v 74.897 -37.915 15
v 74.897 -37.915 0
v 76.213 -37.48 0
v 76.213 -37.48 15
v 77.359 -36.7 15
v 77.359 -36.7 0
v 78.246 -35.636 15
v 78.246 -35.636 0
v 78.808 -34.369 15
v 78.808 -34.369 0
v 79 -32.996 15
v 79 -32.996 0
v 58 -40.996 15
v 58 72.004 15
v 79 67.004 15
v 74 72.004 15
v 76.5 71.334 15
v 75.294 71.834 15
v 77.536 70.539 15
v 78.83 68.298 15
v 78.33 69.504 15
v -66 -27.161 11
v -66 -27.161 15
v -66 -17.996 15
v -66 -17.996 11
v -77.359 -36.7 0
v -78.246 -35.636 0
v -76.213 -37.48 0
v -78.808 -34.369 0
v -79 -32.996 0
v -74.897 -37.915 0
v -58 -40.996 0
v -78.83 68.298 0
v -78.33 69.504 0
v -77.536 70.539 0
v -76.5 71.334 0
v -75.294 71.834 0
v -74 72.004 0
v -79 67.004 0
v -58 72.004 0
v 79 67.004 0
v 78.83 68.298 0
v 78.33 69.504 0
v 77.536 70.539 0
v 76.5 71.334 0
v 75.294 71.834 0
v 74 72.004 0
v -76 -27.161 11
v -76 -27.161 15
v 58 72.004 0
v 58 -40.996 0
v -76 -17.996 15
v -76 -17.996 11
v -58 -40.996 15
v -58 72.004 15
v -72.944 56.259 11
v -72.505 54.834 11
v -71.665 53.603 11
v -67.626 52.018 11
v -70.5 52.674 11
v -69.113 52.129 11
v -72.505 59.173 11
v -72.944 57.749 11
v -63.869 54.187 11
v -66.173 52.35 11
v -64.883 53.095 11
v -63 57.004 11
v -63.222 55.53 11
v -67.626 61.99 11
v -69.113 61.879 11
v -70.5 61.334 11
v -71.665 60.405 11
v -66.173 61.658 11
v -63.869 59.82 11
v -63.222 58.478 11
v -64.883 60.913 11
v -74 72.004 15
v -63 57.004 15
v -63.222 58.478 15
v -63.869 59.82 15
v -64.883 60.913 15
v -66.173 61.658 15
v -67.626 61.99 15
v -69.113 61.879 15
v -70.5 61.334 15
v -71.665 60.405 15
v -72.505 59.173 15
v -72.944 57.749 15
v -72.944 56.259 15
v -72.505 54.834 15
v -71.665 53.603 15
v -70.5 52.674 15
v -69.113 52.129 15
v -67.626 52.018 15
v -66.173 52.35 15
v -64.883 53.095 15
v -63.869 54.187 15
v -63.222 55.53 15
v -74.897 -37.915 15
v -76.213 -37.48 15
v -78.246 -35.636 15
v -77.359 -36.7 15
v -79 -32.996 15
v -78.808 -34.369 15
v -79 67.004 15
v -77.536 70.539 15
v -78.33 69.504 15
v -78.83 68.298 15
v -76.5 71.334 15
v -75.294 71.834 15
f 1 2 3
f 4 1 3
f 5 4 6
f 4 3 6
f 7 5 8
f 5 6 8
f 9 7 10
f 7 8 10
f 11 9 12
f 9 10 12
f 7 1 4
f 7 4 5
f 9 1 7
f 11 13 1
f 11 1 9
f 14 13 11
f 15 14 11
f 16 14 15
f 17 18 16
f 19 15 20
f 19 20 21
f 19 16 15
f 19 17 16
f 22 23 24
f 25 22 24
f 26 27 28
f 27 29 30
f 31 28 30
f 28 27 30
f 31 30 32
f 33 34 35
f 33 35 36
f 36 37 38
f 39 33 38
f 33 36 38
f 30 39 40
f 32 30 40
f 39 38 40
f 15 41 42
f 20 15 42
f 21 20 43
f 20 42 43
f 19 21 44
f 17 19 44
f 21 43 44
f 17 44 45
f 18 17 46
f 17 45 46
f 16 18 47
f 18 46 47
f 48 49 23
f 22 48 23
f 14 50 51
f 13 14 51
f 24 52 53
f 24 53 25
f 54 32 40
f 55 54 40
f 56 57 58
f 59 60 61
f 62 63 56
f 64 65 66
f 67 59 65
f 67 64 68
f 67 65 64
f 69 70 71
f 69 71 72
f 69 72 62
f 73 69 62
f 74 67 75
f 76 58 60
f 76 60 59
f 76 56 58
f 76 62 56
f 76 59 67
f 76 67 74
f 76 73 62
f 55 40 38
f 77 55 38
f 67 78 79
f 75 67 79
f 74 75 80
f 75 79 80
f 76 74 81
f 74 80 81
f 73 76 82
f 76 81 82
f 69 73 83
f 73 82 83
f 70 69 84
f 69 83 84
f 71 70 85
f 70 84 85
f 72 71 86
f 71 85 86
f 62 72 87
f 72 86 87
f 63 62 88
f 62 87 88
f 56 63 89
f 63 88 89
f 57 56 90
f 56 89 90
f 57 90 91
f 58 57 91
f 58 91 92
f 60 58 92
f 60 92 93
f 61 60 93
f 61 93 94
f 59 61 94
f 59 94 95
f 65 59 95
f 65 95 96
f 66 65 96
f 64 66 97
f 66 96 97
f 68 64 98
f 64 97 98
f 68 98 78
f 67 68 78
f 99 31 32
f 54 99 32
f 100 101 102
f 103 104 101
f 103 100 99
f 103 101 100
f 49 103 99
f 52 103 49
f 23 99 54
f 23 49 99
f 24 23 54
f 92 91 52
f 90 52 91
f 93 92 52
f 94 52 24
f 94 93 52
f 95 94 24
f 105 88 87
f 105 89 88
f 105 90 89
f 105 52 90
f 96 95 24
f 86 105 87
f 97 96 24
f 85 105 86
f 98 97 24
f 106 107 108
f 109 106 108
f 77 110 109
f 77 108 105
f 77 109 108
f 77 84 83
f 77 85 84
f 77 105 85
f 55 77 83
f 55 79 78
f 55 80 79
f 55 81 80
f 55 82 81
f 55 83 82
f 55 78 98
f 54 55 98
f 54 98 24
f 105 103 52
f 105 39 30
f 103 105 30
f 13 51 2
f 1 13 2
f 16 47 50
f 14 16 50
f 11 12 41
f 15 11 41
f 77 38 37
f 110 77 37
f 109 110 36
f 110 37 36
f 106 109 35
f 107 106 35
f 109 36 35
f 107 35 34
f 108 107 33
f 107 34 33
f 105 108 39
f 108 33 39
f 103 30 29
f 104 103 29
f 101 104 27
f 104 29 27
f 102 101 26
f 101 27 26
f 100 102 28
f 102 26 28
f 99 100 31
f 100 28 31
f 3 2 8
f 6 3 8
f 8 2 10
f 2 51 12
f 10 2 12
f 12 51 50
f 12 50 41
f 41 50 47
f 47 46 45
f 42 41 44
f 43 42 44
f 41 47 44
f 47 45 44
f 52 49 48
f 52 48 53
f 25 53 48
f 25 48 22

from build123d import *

# Parameters (mm, degrees)
F1_DEPTH = 15
F2_R     = 5
F2_W     = 10
F2_H     = 9.164907
F3_DEPTH = 4


with BuildPart() as f1:
    # F0 (on Top) → F1 (new body)
    with BuildSketch(Plane.XY):
        with BuildLine():
            Line((74, 72.003887), (58, 72.003887))
            Line((58, 72.003887), (58, -37.996113))
            Line((58, -37.996113), (74, -37.996113))
            ThreePointArc((74, -37.996113), (74.450303, -37.975795), (74.896946, -37.915004))
            ThreePointArc((74.896946, -37.915004), (77.839579, -36.198868), (79, -32.996113))
            Line((79, -32.996113), (79, 67.003887))
            ThreePointArc((79, 67.003887), (77.535534, 70.539421), (74, 72.003887))
        make_face()
        with BuildLine():
            Line((74, -37.996113), (58, -37.996113))
            Line((58, -37.996113), (58, -40.996113))
            Line((58, -40.996113), (74.896946, -37.915004))
            ThreePointArc((74.896946, -37.915004), (74.450303, -37.975795), (74, -37.996113))
        make_face()
        with BuildLine():
            Line((-58, -40.996113), (-58, -37.996113))
            Line((-58, -37.996113), (-74, -37.996113))
            ThreePointArc((-74, -37.996113), (-74.450303, -37.975795), (-74.896946, -37.915004))
            Line((-74.896946, -37.915004), (-58, -40.996113))
        make_face()
        with BuildLine():
            Line((-74, -37.996113), (-58, -37.996113))
            Line((-58, -37.996113), (-58, 72.003887))
            Line((-58, 72.003887), (-74, 72.003887))
            ThreePointArc((-74, 72.003887), (-77.535534, 70.539421), (-79, 67.003887))
            Line((-79, 67.003887), (-79, -32.996113))
            ThreePointArc((-79, -32.996113), (-77.839579, -36.198868), (-74.896946, -37.915004))
            ThreePointArc((-74.896946, -37.915004), (-74.450303, -37.975795), (-74, -37.996113))
        make_face()
    extrude(amount=F1_DEPTH)

    # F2 (on face) → F3 (cut)
    with BuildSketch(Plane.XY.offset(15)):
        with Locations((-68, 57.003887)):
            Circle(F2_R)
        with Locations((-71, -22.578566)):
            Rectangle(F2_W, F2_H)
    extrude(amount=-F3_DEPTH, mode=Mode.SUBTRACT)


solid = f1.part
